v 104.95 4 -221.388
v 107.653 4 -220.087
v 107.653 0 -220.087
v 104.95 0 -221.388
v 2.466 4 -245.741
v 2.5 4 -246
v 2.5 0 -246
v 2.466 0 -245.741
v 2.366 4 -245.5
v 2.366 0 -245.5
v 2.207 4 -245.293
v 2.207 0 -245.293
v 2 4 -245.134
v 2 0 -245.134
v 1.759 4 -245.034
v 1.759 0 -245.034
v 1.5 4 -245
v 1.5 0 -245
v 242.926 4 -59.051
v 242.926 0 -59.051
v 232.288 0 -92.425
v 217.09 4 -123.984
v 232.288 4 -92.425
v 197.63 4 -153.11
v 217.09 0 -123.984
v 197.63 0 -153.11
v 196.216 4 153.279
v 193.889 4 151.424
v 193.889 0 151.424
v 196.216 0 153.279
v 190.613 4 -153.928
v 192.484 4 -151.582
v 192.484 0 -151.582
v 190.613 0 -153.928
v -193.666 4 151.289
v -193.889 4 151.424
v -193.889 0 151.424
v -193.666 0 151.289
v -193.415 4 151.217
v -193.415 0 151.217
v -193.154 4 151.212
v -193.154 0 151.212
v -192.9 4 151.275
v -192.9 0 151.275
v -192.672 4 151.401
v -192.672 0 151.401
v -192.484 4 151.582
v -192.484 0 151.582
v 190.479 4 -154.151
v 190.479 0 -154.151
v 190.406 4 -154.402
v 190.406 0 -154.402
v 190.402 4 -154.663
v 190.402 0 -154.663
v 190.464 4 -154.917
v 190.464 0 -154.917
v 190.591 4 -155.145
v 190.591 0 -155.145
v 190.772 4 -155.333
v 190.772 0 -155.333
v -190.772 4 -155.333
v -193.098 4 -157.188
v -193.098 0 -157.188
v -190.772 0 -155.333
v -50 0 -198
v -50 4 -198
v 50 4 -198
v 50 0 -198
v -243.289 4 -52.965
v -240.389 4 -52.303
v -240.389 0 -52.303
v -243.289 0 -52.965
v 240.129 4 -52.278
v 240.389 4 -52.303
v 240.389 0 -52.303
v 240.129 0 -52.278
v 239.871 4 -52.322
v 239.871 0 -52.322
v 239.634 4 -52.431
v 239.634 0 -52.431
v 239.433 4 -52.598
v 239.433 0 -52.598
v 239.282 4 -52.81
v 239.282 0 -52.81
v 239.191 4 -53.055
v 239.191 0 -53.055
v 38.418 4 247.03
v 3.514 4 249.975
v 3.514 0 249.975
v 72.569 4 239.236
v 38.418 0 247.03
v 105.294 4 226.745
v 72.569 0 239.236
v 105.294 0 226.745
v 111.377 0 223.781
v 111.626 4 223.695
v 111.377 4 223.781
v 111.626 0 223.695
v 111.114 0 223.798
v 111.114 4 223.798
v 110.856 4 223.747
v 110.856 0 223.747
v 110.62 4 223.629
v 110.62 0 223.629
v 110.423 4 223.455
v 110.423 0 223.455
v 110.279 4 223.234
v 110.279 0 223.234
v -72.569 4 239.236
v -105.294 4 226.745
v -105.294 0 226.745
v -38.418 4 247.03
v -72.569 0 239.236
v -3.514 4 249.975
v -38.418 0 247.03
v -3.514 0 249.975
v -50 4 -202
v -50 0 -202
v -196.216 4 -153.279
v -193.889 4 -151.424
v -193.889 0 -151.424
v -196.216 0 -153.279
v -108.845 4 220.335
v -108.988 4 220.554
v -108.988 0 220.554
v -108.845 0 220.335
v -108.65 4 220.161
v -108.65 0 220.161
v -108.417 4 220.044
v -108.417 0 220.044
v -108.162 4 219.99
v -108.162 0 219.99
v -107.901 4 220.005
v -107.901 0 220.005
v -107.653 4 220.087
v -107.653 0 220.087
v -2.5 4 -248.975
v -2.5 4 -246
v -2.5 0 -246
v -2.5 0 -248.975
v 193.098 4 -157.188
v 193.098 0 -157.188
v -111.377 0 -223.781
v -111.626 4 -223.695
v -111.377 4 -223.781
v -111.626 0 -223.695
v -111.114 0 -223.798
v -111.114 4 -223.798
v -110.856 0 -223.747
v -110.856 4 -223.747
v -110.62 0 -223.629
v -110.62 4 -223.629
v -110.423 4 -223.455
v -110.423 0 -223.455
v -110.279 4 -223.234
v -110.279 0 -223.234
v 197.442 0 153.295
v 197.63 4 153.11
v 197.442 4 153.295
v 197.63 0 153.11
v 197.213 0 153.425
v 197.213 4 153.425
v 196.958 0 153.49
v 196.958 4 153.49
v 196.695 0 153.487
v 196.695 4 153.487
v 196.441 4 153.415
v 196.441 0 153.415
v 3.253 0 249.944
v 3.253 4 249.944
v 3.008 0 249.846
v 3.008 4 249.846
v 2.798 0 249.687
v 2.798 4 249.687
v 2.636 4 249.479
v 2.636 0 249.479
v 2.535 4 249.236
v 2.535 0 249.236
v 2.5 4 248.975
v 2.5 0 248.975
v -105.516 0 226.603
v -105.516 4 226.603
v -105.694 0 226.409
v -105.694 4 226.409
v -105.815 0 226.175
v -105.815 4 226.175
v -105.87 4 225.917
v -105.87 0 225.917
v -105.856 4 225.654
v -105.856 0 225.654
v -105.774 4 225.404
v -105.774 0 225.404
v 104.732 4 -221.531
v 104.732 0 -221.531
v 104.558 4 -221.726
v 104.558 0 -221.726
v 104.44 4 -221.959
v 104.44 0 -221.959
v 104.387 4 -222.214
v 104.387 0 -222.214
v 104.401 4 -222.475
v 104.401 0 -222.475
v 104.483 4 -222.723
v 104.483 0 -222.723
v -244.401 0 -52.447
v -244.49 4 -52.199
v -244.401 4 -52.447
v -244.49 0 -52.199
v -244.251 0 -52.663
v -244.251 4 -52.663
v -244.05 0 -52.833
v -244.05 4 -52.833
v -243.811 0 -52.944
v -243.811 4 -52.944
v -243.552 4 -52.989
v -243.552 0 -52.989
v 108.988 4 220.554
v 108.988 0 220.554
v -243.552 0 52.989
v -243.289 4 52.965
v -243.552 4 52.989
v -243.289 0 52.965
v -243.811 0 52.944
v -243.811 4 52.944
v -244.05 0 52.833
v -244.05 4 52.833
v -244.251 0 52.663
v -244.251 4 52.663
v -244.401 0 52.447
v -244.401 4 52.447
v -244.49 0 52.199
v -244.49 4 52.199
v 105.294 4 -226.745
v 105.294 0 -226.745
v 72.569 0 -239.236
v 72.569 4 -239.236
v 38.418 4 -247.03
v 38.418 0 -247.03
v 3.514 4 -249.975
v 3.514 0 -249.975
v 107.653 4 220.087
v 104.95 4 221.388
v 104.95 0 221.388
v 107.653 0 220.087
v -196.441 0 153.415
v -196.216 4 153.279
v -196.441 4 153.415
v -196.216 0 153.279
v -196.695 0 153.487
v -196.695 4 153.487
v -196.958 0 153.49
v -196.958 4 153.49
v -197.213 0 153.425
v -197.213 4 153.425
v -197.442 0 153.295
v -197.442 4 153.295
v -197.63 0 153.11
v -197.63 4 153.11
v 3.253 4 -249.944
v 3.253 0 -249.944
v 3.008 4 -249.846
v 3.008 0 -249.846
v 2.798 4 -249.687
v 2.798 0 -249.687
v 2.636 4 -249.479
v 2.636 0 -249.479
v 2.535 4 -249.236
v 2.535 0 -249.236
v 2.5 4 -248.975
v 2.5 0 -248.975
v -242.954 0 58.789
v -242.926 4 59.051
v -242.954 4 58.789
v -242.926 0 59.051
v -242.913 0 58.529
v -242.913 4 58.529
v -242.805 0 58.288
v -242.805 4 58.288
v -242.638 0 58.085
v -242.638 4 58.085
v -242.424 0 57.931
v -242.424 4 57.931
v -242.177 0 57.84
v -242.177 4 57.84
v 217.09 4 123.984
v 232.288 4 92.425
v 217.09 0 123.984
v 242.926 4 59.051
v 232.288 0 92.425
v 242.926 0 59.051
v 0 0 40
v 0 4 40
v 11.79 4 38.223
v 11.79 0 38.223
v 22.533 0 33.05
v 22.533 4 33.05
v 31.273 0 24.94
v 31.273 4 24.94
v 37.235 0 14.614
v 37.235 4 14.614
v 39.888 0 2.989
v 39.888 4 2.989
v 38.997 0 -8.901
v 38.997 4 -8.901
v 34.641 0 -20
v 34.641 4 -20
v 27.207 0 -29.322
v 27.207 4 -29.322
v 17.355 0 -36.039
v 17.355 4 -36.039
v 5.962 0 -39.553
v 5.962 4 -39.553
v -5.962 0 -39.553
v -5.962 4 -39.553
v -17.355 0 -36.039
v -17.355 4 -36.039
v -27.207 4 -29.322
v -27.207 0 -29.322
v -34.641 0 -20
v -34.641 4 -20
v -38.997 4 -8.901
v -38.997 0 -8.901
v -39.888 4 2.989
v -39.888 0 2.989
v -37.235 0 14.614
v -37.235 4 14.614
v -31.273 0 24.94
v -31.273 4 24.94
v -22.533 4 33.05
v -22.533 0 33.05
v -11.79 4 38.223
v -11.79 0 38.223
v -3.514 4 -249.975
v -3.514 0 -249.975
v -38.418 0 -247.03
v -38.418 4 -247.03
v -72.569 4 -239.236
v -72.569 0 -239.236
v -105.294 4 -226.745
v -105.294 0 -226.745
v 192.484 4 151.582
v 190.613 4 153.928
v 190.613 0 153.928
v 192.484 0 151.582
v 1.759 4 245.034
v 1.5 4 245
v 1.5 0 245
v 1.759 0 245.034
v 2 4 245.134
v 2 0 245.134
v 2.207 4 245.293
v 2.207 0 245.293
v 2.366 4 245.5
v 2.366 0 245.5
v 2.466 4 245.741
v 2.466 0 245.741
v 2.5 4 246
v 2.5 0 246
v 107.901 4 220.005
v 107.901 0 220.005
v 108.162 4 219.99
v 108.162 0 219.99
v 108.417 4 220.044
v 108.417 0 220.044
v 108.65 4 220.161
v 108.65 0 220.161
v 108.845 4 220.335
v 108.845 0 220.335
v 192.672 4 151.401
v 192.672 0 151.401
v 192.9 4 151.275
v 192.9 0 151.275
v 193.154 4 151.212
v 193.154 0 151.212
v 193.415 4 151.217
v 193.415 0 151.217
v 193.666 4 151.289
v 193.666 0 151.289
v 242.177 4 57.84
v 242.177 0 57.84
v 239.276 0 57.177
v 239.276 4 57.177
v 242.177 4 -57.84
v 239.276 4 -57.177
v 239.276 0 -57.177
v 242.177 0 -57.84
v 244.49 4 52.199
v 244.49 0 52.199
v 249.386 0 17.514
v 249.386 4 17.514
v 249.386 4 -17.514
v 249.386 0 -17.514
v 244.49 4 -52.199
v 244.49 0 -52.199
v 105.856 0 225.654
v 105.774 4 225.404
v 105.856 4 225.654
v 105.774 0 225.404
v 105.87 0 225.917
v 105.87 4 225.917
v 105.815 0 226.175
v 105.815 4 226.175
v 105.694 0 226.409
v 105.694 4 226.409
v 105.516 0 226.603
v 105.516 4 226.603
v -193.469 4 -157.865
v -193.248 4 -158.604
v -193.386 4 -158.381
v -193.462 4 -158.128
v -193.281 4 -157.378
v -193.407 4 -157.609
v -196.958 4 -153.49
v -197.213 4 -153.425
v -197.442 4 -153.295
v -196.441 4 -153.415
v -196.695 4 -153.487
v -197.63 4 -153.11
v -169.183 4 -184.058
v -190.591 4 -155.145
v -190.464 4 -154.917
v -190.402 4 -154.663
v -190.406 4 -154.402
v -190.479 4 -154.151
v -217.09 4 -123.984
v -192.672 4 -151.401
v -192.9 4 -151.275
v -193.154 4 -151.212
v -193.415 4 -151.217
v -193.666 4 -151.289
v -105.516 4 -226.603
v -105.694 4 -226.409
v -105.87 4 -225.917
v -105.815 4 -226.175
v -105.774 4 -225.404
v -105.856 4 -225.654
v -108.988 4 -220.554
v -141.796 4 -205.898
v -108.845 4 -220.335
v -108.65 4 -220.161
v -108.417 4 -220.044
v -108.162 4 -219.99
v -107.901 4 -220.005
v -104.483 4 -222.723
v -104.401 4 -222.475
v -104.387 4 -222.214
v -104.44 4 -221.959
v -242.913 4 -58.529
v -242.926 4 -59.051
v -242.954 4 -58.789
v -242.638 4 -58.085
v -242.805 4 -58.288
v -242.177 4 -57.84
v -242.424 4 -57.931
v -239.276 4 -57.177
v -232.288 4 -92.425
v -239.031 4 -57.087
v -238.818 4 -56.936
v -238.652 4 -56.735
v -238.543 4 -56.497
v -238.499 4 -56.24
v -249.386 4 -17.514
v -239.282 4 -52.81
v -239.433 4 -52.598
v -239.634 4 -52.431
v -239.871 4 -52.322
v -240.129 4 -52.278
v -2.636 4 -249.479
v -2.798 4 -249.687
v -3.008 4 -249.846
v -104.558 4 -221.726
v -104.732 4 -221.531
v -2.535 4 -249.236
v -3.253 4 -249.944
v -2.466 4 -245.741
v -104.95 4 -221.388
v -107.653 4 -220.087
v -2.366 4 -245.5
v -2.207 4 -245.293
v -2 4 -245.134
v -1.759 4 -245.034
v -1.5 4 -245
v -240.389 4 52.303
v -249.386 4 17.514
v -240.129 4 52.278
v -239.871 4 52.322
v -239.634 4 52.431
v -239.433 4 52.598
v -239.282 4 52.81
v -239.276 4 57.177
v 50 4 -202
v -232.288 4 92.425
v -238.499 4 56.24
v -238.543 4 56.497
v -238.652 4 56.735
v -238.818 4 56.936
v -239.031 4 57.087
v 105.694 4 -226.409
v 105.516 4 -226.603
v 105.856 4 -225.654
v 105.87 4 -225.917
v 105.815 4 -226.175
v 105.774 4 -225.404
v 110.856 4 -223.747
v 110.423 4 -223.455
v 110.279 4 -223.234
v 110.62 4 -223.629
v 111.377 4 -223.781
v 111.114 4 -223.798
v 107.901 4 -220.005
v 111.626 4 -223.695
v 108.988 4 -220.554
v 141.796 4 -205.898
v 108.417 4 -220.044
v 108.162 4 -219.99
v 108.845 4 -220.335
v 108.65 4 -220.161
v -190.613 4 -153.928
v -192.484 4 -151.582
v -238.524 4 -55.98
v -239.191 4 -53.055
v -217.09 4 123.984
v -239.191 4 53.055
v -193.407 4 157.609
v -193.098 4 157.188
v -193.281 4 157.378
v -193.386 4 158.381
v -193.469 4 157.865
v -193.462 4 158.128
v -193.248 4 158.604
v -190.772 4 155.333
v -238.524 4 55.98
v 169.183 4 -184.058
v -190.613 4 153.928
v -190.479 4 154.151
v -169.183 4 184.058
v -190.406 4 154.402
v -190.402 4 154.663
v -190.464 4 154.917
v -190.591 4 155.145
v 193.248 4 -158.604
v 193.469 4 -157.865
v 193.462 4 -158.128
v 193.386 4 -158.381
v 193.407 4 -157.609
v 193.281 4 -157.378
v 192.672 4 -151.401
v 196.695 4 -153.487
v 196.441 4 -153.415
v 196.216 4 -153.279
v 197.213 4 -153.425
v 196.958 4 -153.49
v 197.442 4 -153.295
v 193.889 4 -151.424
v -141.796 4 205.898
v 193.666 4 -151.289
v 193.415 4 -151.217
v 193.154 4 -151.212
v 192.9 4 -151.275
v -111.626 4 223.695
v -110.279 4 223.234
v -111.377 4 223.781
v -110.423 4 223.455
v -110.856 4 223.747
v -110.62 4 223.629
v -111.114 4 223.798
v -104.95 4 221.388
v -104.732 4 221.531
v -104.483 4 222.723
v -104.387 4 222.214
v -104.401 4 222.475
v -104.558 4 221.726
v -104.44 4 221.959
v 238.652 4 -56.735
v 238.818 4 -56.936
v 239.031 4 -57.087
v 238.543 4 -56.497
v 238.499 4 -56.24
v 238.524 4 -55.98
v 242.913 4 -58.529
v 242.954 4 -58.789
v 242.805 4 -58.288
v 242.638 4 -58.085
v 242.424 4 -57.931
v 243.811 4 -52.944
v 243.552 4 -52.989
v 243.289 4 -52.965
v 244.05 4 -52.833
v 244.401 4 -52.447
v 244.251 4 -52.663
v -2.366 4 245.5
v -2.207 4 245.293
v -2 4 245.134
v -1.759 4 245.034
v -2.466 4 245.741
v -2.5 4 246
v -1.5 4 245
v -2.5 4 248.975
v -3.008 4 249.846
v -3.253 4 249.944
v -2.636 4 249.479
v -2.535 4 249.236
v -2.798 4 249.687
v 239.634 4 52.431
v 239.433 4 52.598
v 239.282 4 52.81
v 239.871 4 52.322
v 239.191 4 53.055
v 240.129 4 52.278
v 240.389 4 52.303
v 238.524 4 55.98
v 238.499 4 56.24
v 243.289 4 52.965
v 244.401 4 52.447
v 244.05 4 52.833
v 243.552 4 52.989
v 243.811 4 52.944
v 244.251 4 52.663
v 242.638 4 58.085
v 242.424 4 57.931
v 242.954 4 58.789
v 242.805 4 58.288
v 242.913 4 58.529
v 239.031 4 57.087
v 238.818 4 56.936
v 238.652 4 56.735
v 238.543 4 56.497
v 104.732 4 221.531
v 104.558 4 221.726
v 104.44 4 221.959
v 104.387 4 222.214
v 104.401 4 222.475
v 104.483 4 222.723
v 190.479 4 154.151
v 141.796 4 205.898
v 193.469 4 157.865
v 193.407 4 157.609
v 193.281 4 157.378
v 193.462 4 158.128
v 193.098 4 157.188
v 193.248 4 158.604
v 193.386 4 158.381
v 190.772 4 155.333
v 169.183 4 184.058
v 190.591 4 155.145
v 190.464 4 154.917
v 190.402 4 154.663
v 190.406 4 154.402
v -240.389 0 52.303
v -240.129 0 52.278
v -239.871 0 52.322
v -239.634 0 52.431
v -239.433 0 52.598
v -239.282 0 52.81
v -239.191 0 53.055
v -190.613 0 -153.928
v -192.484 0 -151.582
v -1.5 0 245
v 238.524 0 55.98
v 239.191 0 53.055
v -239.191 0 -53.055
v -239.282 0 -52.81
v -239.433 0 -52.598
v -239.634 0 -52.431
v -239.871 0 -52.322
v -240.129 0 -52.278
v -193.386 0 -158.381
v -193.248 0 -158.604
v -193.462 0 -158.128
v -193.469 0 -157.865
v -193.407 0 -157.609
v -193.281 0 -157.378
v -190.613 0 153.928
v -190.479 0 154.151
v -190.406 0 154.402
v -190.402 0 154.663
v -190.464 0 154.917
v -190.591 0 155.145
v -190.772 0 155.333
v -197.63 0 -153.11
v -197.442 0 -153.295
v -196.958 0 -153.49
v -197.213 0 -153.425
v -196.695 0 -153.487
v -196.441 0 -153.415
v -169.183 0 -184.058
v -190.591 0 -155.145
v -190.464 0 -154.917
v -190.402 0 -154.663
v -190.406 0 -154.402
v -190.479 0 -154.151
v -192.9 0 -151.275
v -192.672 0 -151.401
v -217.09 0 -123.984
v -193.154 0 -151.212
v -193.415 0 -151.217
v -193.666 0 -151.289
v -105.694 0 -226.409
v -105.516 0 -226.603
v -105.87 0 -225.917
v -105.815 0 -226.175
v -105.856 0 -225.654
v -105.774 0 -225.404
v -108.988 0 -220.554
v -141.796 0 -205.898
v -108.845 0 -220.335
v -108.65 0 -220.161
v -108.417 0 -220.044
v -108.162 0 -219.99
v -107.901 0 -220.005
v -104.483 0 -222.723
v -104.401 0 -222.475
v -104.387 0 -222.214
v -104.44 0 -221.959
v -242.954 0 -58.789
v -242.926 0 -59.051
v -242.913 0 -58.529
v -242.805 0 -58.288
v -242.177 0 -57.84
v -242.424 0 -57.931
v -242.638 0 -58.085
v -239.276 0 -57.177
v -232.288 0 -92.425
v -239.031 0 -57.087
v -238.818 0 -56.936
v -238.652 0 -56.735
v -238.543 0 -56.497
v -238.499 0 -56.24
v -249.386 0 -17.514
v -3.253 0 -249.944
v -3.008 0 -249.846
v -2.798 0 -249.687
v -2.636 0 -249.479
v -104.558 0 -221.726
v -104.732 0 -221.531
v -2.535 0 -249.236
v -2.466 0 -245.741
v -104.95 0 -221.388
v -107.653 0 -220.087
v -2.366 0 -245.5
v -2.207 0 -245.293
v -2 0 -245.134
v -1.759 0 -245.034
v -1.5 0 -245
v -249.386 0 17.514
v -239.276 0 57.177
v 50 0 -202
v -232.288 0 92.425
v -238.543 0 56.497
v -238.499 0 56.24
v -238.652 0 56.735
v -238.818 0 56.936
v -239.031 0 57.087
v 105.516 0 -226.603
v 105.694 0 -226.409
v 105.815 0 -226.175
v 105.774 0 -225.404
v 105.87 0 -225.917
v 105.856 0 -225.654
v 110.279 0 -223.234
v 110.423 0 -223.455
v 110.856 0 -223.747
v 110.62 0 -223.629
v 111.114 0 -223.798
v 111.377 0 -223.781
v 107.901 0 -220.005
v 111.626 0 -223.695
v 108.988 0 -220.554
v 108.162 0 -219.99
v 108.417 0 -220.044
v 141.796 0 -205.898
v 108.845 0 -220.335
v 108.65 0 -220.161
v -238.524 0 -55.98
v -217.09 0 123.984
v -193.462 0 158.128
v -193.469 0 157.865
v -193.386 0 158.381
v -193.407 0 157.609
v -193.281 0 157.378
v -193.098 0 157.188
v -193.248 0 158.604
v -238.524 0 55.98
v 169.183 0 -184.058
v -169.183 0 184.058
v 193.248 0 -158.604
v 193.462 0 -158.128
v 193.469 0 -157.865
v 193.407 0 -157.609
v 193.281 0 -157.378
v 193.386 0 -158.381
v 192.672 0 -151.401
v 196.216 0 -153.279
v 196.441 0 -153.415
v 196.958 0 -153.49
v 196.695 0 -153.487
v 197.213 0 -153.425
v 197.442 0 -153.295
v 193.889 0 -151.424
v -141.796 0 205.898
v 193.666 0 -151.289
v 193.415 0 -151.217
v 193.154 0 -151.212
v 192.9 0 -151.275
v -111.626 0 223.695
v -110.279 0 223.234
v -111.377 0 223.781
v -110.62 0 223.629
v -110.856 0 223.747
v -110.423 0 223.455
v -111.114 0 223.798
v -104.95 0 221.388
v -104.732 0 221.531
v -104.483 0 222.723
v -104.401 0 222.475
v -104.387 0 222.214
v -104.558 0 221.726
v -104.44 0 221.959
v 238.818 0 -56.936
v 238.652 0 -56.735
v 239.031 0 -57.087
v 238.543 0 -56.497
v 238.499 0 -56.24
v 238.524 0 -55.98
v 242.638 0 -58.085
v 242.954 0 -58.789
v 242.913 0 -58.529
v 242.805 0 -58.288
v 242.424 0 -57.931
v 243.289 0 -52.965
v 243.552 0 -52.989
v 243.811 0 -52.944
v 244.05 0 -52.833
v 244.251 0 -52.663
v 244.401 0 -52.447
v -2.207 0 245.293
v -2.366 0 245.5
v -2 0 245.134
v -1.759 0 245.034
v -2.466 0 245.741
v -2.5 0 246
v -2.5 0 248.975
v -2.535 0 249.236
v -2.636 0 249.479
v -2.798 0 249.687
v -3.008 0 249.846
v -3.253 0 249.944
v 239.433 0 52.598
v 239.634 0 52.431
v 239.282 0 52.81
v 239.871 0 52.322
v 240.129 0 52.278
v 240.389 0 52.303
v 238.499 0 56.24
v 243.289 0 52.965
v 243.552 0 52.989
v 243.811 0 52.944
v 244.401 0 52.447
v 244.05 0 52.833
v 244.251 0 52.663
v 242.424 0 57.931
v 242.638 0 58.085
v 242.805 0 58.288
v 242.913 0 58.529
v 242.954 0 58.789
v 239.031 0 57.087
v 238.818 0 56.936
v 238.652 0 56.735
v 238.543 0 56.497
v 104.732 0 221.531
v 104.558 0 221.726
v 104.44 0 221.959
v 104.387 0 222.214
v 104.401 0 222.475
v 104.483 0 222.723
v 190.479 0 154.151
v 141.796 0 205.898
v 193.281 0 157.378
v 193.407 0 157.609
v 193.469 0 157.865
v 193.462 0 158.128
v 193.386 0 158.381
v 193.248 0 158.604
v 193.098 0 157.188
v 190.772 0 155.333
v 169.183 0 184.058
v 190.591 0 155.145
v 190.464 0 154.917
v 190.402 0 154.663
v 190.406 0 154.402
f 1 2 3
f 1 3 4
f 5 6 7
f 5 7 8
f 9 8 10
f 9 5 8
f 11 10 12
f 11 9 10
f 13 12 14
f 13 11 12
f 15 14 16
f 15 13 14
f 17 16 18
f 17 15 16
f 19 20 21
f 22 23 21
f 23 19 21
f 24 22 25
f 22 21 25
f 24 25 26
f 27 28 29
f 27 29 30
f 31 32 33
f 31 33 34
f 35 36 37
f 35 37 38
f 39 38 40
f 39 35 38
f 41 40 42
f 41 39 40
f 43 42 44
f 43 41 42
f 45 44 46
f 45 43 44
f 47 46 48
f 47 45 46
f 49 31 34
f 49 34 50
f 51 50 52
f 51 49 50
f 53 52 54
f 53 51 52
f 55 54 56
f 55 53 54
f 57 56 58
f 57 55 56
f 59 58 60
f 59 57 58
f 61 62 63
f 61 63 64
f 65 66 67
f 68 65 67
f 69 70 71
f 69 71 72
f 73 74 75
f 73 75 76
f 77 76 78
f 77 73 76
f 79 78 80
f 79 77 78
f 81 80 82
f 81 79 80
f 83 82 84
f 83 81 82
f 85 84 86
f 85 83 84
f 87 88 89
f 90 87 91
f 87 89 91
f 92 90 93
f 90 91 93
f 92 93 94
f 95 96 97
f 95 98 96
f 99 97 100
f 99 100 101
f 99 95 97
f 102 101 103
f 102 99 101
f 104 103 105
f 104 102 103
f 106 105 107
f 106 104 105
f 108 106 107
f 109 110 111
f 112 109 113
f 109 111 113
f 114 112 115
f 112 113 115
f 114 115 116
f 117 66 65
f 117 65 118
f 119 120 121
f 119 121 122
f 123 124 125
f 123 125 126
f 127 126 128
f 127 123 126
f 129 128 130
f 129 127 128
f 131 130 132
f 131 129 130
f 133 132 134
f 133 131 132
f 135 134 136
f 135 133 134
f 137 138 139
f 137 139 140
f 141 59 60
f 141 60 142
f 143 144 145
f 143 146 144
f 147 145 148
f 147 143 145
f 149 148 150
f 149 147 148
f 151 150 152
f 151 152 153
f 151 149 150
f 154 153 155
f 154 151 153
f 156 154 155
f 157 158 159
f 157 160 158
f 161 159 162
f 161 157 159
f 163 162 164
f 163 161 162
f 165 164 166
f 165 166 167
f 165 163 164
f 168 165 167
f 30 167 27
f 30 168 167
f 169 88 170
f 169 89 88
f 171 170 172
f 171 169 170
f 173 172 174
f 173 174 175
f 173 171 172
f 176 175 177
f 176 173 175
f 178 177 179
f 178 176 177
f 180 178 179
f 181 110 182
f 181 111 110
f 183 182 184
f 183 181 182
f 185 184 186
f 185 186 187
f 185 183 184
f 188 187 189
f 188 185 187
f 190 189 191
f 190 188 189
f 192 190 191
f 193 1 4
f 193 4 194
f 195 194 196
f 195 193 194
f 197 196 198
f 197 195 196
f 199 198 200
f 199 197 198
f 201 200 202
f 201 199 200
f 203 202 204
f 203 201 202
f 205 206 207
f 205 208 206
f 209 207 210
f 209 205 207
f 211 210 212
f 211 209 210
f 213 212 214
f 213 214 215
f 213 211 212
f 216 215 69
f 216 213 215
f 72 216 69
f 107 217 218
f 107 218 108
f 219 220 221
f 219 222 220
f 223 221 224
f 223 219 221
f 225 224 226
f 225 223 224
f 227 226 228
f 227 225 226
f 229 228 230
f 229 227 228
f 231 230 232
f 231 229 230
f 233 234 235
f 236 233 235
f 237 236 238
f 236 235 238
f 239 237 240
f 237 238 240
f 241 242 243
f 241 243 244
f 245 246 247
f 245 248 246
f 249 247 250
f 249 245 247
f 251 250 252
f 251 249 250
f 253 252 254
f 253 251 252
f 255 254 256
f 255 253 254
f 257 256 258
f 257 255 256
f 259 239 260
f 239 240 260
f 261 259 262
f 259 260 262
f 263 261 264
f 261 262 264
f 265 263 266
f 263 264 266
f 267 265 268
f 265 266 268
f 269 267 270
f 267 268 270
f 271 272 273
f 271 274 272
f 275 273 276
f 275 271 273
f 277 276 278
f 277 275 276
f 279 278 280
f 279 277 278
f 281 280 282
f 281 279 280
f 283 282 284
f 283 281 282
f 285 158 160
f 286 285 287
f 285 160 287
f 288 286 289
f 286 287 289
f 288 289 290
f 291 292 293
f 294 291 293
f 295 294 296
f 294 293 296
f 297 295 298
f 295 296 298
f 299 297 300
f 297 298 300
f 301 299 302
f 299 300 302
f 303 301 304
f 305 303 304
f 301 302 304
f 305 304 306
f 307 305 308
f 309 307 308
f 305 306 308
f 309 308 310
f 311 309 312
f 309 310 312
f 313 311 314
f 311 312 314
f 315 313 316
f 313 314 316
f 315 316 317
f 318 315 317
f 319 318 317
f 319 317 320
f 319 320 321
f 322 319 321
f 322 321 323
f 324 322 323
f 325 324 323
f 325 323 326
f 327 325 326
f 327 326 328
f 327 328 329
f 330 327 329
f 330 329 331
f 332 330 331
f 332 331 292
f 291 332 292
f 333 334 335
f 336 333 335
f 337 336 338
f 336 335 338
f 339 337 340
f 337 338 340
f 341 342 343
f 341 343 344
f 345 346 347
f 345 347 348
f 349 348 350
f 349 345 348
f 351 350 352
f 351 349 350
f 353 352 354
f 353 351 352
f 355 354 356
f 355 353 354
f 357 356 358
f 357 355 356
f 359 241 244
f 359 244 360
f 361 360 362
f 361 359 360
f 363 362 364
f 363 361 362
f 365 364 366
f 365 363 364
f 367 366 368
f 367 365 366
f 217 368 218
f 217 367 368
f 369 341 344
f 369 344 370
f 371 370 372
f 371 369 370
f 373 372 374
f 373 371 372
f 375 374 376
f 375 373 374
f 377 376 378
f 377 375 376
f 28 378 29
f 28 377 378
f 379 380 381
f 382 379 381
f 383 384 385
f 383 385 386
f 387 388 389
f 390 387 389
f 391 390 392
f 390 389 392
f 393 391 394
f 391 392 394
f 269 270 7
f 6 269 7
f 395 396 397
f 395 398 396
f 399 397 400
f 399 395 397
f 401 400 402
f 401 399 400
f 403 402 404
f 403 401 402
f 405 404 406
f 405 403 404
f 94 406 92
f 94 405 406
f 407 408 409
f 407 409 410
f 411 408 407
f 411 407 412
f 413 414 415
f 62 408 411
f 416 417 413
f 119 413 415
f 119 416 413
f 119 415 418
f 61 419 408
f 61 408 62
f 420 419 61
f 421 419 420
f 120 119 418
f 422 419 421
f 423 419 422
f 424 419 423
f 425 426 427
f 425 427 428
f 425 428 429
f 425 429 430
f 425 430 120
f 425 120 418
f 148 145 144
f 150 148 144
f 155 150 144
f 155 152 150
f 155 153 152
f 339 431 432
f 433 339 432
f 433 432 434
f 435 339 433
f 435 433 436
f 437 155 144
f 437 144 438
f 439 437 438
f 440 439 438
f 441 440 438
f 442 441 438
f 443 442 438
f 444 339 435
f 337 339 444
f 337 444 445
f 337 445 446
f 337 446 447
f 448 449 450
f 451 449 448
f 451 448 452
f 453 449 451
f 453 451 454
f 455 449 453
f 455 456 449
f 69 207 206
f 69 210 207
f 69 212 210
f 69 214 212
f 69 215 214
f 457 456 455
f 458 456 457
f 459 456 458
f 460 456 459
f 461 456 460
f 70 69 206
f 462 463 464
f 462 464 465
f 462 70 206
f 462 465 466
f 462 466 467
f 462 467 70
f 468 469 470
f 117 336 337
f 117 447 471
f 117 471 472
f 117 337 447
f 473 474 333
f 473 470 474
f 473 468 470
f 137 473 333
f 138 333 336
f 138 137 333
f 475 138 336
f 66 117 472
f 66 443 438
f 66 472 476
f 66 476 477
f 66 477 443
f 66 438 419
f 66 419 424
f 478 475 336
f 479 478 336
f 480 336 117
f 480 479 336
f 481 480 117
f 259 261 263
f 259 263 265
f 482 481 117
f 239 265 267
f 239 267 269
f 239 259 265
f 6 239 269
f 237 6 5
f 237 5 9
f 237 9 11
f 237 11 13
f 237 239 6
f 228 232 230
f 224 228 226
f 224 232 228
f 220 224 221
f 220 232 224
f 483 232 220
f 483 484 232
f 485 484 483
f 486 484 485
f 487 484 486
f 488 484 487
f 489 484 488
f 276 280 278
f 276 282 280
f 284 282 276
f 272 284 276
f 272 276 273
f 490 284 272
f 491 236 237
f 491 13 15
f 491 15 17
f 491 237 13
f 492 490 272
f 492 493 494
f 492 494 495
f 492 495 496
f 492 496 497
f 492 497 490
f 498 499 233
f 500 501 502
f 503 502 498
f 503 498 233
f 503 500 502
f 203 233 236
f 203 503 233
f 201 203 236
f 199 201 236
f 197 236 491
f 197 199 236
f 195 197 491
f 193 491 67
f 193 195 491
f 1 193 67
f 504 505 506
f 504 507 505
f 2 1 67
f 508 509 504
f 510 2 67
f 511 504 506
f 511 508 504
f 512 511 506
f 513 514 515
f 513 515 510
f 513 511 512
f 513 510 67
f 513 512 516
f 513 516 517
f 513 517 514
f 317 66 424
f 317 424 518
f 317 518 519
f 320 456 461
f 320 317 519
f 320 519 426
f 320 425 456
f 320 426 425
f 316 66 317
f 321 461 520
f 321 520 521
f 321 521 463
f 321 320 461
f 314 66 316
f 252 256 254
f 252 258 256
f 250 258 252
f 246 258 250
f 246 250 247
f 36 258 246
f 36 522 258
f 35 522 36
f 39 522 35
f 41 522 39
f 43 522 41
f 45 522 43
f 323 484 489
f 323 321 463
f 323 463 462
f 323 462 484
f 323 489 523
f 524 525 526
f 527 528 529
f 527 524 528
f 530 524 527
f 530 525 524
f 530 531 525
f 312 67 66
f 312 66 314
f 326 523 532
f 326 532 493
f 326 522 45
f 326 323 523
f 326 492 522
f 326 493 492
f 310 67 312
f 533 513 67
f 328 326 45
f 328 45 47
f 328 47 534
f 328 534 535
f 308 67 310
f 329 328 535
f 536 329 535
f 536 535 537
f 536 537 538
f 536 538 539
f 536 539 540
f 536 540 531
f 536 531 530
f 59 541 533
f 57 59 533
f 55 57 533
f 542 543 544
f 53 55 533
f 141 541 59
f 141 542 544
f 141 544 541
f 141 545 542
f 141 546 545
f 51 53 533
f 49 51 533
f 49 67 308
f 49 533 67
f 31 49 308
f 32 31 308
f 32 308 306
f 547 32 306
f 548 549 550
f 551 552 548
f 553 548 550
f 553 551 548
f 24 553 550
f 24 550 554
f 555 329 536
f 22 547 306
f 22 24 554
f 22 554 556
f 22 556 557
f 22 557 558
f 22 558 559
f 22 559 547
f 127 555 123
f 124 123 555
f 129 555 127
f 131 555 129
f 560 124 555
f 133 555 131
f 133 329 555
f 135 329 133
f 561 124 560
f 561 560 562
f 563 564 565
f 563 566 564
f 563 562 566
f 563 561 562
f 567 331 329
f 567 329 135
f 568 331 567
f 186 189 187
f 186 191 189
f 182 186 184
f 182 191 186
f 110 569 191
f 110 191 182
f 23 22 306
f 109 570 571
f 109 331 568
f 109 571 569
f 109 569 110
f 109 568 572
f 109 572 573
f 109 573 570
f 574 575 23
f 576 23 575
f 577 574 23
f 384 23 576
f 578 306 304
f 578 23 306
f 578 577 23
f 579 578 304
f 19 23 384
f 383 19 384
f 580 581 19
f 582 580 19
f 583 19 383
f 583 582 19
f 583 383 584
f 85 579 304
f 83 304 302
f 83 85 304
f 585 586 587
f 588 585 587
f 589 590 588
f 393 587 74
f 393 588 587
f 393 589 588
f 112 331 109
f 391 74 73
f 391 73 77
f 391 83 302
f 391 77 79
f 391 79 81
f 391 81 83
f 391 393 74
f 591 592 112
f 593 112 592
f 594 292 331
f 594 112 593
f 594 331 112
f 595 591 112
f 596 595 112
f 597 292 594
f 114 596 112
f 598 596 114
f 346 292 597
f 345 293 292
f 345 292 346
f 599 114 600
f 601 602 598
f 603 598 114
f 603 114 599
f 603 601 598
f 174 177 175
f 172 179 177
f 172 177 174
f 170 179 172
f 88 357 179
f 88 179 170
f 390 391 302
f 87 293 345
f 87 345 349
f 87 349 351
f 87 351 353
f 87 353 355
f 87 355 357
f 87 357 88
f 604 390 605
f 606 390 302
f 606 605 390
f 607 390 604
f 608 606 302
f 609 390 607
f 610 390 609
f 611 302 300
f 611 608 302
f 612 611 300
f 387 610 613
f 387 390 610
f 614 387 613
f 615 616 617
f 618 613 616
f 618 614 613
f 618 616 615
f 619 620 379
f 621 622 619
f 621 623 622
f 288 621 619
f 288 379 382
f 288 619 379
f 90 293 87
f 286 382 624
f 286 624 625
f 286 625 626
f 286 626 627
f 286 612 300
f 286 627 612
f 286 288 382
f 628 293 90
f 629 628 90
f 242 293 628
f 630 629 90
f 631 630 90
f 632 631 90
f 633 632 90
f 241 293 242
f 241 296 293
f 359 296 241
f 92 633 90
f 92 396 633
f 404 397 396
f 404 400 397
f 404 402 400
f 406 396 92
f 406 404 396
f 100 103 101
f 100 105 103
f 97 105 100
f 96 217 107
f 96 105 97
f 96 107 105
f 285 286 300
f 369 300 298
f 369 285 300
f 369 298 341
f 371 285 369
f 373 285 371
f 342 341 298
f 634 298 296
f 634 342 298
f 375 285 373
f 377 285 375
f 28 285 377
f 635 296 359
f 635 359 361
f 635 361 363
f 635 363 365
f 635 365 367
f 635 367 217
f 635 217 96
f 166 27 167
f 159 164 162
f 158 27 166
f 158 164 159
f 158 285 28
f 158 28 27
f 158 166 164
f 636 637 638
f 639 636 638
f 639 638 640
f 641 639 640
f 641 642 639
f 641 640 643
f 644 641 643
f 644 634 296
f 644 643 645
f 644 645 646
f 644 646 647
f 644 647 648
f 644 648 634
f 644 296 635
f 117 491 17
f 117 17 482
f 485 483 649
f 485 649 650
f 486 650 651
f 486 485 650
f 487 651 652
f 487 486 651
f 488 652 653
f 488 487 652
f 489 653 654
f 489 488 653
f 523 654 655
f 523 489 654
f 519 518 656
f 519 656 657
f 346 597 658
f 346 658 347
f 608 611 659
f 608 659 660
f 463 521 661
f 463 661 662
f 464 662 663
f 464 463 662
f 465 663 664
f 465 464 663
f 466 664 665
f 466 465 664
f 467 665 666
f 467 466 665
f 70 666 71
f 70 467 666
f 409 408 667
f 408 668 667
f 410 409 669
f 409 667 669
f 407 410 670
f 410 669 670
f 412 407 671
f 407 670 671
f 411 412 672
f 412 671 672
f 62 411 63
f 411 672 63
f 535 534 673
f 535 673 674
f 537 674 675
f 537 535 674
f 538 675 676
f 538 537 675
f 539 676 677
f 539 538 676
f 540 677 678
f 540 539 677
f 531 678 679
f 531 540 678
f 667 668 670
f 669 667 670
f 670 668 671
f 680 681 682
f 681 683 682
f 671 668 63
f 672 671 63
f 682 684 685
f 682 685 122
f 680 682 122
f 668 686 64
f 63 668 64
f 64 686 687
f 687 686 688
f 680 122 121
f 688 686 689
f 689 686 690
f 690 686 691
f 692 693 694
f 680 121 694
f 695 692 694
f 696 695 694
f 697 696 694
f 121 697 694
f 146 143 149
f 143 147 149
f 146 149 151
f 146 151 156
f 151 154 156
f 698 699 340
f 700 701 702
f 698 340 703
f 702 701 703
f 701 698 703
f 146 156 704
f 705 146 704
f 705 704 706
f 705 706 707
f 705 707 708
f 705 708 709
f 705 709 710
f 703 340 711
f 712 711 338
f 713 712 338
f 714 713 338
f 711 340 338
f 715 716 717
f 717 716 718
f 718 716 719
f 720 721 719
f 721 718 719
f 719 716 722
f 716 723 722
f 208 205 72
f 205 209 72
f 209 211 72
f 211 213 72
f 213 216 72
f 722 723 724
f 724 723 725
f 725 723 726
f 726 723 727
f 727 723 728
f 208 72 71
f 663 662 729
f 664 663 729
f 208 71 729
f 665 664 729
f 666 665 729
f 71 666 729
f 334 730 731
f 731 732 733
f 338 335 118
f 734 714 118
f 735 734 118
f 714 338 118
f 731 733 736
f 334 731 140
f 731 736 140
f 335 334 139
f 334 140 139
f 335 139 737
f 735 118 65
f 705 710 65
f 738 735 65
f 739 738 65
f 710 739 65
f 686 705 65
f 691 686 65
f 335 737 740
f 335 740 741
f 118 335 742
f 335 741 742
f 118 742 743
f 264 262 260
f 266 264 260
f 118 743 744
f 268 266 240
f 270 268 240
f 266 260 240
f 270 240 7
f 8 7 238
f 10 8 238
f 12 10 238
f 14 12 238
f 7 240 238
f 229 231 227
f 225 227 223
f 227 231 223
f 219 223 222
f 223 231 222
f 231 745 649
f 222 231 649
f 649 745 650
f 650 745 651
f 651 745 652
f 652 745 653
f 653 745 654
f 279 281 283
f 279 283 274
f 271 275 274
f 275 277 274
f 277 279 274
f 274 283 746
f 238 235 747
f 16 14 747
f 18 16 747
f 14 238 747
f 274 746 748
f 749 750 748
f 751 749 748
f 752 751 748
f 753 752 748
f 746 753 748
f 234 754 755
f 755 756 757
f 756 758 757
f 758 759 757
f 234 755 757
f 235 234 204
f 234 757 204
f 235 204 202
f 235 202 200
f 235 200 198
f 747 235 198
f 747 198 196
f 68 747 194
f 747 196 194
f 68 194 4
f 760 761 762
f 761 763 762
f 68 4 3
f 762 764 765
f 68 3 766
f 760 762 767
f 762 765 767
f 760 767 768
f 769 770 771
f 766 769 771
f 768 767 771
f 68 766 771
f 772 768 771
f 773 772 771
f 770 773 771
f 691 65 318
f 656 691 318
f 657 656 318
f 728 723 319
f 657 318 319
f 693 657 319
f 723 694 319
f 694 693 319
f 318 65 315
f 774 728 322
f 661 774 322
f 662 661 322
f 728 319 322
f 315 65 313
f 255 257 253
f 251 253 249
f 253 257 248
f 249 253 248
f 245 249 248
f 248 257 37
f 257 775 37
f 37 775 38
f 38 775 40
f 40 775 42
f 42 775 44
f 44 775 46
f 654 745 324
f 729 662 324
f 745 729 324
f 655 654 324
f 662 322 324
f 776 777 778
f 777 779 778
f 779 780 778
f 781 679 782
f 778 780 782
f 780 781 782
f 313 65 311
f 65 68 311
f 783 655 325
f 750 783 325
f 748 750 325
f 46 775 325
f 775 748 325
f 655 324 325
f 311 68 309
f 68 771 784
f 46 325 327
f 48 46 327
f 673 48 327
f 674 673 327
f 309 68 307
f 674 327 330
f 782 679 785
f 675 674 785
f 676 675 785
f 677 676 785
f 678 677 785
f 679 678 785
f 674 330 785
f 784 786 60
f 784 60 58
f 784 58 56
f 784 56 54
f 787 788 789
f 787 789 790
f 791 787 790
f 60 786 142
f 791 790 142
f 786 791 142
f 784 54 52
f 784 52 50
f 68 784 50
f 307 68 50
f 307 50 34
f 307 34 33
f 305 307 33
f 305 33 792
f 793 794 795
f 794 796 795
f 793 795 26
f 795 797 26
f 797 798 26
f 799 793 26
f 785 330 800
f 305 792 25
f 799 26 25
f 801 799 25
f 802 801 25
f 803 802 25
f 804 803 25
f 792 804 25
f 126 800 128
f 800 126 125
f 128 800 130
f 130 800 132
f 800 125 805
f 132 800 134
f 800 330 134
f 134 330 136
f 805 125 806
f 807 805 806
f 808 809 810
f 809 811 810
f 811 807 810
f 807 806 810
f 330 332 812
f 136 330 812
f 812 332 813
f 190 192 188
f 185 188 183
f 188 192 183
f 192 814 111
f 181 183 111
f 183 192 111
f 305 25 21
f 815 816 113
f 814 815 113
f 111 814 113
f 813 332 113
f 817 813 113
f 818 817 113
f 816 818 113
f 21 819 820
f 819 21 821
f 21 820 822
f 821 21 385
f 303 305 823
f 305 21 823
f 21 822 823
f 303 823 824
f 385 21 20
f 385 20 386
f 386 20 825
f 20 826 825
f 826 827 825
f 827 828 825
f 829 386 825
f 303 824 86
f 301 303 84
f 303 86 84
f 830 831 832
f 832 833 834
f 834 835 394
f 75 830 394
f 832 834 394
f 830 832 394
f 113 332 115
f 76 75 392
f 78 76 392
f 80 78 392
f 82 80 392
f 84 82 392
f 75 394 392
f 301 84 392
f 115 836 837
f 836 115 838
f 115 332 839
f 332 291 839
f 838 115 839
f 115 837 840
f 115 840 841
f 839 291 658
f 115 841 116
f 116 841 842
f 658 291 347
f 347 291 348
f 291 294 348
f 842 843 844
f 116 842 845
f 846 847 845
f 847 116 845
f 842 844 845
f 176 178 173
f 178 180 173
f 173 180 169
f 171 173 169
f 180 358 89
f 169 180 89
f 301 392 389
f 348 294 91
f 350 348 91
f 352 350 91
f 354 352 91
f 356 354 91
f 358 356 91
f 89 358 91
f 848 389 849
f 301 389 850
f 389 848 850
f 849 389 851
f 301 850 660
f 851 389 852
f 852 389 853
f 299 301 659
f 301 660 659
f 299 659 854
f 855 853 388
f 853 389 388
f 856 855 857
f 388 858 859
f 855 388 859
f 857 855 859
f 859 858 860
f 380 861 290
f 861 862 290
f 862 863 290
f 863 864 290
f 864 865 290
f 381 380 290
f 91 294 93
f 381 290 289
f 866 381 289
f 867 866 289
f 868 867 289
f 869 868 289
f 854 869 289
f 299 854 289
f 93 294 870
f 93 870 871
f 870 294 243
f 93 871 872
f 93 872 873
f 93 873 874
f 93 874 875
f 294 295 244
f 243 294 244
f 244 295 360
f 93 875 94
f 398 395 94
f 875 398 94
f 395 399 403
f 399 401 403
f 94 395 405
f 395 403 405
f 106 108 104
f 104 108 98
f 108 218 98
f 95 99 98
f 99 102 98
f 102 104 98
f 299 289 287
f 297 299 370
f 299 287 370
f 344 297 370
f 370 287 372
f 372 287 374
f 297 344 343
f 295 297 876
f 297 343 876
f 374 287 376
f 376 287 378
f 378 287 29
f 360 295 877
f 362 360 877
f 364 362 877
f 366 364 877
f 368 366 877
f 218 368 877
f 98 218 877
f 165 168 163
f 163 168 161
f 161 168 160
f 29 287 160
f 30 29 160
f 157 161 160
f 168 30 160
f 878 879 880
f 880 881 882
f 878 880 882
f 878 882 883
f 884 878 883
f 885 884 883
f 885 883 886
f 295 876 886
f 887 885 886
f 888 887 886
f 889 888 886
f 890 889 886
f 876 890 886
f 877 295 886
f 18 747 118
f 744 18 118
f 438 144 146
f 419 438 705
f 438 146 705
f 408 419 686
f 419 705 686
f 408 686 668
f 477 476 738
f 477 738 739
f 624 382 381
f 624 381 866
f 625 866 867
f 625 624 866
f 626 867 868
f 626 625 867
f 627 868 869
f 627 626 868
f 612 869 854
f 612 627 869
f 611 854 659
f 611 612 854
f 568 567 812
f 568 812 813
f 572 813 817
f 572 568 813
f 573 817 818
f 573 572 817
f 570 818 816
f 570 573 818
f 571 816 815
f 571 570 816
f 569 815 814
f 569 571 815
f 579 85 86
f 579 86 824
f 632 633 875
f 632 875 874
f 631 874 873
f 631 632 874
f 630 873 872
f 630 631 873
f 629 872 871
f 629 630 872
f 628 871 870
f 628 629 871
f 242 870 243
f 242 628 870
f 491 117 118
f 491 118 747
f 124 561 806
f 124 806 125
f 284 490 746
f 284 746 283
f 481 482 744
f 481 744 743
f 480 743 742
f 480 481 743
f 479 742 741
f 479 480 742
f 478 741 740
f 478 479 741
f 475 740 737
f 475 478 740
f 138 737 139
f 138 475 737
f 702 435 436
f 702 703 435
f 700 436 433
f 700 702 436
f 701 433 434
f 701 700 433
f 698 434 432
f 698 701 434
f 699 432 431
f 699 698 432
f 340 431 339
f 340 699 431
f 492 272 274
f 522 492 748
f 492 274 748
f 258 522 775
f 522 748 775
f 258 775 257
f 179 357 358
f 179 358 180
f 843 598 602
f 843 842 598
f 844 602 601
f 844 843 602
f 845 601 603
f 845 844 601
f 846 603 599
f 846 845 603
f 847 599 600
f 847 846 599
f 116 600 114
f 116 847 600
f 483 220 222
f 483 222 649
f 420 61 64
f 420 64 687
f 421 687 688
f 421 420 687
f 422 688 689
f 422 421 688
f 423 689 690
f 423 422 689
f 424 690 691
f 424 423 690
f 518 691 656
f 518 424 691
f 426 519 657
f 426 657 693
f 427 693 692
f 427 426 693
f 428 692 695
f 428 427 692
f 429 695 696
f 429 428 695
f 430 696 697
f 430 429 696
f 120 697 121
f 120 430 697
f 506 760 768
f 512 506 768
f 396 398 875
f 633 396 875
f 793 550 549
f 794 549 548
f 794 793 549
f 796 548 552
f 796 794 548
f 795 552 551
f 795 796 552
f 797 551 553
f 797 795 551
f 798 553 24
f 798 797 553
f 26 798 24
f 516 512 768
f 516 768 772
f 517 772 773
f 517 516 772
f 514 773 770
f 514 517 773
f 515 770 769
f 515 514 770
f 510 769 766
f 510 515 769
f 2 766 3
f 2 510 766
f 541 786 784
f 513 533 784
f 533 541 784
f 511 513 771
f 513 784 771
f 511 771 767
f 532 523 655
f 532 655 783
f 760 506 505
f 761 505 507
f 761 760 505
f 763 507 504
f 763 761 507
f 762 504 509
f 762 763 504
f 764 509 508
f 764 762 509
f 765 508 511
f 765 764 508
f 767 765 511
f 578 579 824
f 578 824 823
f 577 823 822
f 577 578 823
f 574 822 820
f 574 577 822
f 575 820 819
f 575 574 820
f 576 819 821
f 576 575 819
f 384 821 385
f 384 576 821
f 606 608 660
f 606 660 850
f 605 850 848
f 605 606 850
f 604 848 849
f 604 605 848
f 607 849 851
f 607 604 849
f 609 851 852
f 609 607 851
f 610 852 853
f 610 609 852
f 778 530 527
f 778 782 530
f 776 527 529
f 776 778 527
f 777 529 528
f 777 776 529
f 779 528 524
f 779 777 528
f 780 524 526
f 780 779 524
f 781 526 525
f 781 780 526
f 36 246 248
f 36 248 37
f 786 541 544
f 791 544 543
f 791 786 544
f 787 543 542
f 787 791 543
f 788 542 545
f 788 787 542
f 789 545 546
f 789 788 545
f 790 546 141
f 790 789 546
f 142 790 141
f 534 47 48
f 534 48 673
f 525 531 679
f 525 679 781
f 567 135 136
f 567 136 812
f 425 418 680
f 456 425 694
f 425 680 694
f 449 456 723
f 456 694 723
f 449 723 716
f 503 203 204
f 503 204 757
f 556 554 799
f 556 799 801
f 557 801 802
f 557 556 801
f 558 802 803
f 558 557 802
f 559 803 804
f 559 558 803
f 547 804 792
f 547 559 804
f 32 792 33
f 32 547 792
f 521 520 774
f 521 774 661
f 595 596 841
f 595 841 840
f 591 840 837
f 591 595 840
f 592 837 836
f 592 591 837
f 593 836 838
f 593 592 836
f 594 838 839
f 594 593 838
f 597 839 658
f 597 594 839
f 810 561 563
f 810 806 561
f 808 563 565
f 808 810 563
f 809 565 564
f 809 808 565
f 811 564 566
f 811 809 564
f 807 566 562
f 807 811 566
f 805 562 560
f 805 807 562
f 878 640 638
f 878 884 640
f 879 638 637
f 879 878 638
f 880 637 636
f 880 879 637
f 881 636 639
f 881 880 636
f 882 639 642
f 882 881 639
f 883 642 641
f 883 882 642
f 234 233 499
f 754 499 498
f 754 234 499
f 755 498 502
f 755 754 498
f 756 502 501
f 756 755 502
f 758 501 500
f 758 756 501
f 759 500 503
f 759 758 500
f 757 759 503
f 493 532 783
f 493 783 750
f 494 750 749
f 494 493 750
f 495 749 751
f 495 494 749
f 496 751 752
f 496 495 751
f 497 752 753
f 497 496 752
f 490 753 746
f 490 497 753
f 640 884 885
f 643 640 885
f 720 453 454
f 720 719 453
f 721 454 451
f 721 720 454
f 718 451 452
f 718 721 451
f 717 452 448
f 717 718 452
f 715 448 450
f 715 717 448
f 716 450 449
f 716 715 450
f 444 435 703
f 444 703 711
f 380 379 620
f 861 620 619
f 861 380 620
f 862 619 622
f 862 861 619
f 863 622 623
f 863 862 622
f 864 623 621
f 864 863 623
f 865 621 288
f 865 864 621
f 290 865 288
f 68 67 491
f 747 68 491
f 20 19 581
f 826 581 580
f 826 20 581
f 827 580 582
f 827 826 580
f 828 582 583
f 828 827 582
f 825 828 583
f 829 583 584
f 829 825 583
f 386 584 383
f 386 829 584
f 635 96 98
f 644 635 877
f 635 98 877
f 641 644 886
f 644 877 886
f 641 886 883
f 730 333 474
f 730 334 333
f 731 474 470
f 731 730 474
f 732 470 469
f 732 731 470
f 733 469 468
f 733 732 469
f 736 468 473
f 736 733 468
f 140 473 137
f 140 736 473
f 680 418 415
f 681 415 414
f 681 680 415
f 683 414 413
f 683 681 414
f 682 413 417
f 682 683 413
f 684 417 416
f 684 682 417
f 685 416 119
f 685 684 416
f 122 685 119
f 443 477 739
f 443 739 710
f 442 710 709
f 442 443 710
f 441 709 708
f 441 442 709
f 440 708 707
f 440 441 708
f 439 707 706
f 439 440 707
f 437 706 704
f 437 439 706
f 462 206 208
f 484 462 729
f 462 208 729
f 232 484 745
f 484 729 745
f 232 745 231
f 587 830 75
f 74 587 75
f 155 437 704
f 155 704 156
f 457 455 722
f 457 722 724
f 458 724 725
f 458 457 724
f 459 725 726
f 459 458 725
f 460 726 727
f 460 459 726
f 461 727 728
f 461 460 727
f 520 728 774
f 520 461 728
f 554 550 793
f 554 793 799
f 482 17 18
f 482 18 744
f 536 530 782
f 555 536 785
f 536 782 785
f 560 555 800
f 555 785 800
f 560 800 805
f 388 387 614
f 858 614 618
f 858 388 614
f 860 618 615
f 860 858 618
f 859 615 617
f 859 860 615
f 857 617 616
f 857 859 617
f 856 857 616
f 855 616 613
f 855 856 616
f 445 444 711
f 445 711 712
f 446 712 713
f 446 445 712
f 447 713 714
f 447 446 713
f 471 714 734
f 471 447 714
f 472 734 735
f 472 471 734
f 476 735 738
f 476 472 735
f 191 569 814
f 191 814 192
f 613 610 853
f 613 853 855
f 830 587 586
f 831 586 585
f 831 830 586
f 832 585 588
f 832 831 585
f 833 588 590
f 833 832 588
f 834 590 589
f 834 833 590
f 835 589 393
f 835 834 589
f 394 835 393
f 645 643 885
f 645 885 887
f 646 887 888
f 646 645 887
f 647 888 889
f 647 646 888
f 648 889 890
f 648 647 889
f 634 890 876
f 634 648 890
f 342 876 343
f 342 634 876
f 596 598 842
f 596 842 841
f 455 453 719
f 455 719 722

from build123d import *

# Parameters (mm, degrees)
SKETCH1_R                = 250
BOSS_EXTRUDE1_DEPTH      = 4
CUT_EXTRUDE5_DEPTH       = 4
FILLET1_R                = 1
CIRPATTERN1_COUNT        = 14
FILLET1_OF_CIRPATTERN1_R = 1
SKETCH12_R               = 40
CUT_EXTRUDE6_DEPTH       = 10
SKETCH16_W               = 100
SKETCH16_H               = 4
CUT_EXTRUDE10_DEPTH      = 100


with BuildPart() as part:
    # Sketch1 → Boss-Extrude1 (new body)
    with BuildSketch(Plane(origin=(0, 0, 0), x_dir=(1, 0, 0), z_dir=(0, 1, 0))):
        with Locations(Location((0, 0, 0), (0, 0, 270))):
            Circle(SKETCH1_R)
    extrude(amount=BOSS_EXTRUDE1_DEPTH)

    # Sketch11 → Cut-Extrude5 (cut)
    with BuildSketch(Plane(origin=(0, 4, 0), x_dir=(1, 0, 0), z_dir=(0, 1, 0))):
        with BuildLine():
            Line((1.5, 245), (-1.5, 245))
            ThreePointArc((-1.5, 245), (-2.207106781, 245.292893219), (-2.5, 246))
            Line((-2.5, 246), (-2.5, 255))
            Line((-2.5, 255), (2.5, 255))
            Line((2.5, 255), (2.5, 246))
            ThreePointArc((2.5, 246), (2.207106781, 245.292893219), (1.5, 245))
        make_face()
    cut_extrude5 = extrude(amount=-CUT_EXTRUDE5_DEPTH, mode=Mode.SUBTRACT)

    # Fillet1
    fillet1_edges = [part.edges().sort_by_distance(p)[0] for p in [
        (-2.5, 2, -249.987499687),
        (2.5, 2, -249.987499687),
    ]]
    fillet(fillet1_edges, radius=FILLET1_R)

    # CirPattern1: Cut-Extrude5 ×14 about axis
    cirpattern1_axis = Axis((0, 0, 0), (0, 1, 0))
    for i in range(1, CIRPATTERN1_COUNT):
        add(cut_extrude5.rotate(cirpattern1_axis, i * 360 / CIRPATTERN1_COUNT), mode=Mode.SUBTRACT)

    # Fillet1 of CirPattern1
    fillet1_of_cirpattern1_edges = [part.edges().sort_by_distance(p)[0] for p in [
        (-110.717933267, 2, -224.146245235),
        (-106.213088927, 2, -226.315663931),
        (-197.006821984, 2, -153.910077941),
        (-193.889372974, 2, -157.819235353),
        (-244.276093477, 2, -53.190132127),
        (-243.163488807, 2, -58.064771688),
        (-243.163488807, 2, 58.064771688),
        (-244.276093477, 2, 53.190132127),
        (-193.889372974, 2, 157.819235353),
        (-197.006821984, 2, 153.910077941),
        (-106.213088927, 2, 226.315663931),
        (-110.717933267, 2, 224.146245235),
        (2.5, 2, 249.987499687),
        (-2.5, 2, 249.987499687),
        (110.717933267, 2, 224.146245235),
        (106.213088927, 2, 226.315663931),
        (197.006821984, 2, 153.910077941),
        (193.889372974, 2, 157.819235353),
        (244.276093477, 2, 53.190132127),
        (243.163488807, 2, 58.064771688),
        (243.163488807, 2, -58.064771688),
        (244.276093477, 2, -53.190132127),
        (193.889372974, 2, -157.819235353),
        (197.006821984, 2, -153.910077941),
        (106.213088927, 2, -226.315663931),
        (110.717933267, 2, -224.146245235),
    ]]
    fillet(fillet1_of_cirpattern1_edges, radius=FILLET1_OF_CIRPATTERN1_R)

    # Sketch12 → Cut-Extrude6 (cut)
    with BuildSketch(Plane(origin=(0, 4, 0), x_dir=(1, 0, 0), z_dir=(0, 1, 0))):
        with Locations(Location((0, 0, 0), (0, 0, 270))):
            Circle(SKETCH12_R)
    extrude(amount=-CUT_EXTRUDE6_DEPTH, mode=Mode.SUBTRACT)

    # Sketch16 → Cut-Extrude10 (cut)
    with BuildSketch(Plane(origin=(0, 4, 0), x_dir=(1, 0, 0), z_dir=(0, 1, 0))):
        with Locations((0, 200)):
            Rectangle(SKETCH16_W, SKETCH16_H)
    extrude(amount=-CUT_EXTRUDE10_DEPTH, mode=Mode.SUBTRACT)


solid = part.part
